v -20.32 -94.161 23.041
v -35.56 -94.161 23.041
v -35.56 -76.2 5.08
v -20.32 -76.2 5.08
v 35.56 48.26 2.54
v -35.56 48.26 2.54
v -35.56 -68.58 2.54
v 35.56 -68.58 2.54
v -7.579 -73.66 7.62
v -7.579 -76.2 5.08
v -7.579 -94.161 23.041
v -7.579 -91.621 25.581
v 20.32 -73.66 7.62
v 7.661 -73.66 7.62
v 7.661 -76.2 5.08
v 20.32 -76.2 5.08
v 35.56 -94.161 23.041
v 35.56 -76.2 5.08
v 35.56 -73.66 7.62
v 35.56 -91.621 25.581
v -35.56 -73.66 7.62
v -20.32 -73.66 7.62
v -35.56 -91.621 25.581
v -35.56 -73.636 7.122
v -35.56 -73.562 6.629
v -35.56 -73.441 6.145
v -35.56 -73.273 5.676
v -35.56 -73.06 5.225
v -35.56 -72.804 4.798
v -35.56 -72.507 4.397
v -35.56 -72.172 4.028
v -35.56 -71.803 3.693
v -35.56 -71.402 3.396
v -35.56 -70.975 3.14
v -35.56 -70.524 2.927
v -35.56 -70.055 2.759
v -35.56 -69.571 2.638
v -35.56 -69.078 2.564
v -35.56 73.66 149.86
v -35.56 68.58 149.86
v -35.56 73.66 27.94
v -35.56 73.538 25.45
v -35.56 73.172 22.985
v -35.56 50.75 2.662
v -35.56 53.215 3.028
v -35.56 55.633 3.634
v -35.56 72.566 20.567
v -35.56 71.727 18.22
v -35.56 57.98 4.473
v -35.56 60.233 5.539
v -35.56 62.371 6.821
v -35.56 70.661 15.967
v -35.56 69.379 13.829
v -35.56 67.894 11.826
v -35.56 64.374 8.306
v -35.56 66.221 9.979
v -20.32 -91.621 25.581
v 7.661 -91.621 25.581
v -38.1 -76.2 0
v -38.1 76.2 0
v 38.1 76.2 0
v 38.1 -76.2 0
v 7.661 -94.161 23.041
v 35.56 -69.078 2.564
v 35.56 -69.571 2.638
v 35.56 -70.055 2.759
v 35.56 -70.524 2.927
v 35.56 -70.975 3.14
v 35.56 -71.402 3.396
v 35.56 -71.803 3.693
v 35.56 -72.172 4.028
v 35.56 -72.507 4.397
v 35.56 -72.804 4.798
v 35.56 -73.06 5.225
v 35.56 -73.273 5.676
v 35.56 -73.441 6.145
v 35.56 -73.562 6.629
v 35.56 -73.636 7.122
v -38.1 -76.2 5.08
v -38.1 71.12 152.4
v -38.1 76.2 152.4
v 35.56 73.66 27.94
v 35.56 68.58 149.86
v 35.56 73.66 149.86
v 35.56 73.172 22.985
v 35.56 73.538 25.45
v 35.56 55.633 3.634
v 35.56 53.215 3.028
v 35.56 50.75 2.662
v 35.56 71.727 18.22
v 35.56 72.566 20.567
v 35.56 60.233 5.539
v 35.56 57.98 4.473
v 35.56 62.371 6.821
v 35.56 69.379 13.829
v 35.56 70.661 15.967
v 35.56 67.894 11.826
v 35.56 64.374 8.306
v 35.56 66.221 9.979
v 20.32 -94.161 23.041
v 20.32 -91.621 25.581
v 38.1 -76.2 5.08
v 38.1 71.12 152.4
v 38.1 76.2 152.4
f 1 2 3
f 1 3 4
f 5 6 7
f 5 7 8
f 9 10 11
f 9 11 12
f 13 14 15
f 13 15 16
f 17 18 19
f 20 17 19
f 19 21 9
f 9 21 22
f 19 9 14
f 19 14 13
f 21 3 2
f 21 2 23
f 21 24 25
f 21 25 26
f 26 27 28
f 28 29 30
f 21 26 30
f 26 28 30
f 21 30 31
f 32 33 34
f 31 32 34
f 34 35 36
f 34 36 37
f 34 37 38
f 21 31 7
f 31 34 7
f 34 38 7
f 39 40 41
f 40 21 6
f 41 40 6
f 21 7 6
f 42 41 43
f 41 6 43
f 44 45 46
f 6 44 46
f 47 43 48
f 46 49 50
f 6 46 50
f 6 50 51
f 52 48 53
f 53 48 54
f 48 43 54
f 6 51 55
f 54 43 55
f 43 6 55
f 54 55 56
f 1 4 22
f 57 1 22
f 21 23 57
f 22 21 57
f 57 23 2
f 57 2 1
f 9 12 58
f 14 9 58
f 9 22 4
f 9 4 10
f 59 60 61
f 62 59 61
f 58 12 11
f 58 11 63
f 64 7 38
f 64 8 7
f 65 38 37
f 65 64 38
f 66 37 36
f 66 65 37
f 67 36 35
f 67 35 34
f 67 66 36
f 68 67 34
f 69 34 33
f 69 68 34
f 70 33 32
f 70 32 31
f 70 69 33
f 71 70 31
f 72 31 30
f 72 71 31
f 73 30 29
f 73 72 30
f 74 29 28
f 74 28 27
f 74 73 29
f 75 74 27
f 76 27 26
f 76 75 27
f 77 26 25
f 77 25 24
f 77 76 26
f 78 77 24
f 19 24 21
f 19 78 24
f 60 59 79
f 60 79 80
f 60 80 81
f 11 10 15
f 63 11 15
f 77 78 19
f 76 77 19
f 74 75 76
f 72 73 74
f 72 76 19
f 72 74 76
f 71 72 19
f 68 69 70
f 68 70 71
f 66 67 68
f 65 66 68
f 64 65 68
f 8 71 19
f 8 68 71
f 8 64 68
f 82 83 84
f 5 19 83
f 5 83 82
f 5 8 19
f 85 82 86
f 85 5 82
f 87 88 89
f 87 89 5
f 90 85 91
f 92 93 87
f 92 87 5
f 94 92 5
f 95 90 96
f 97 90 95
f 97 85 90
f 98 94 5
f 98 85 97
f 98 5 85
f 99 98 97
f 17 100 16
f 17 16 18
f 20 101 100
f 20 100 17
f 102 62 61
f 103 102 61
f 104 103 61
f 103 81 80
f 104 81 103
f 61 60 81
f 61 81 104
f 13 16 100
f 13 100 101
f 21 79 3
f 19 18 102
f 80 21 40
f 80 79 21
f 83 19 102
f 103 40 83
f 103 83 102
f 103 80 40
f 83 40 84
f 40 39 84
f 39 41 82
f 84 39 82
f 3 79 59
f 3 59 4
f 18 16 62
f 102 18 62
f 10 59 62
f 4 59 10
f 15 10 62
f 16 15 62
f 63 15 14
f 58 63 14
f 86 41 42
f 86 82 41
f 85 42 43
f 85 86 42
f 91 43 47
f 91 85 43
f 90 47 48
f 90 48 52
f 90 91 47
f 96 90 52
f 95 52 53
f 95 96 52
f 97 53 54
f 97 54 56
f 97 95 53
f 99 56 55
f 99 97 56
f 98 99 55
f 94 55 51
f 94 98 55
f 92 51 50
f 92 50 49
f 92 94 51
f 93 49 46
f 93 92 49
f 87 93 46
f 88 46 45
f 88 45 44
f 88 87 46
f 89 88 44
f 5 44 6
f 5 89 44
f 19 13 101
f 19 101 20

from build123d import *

# Parameters (mm, degrees)
F0_W     = 76.2
F0_H     = 152.4
F1_DEPTH = 152.4
F2_SIZE  = 147.32
F3_T     = -2.54
F4_R     = 25.4
F5_R     = 5.07999
F6_W     = 15.24
F6_H     = 3.5921024484
F7_DEPTH = 25.4


# Not quite as in the source:
# - a fillet or chamfer is up to 0.001 mm smaller than in the source, because OpenCascade refuses the exact size


with BuildPart() as f1:
    # F0 (on Top) → F1 (new body)
    with BuildSketch(Plane.XY):
        Rectangle(F0_W, F0_H)
    extrude(amount=F1_DEPTH)

    # F2
    f2_edges = [f1.edges().sort_by_distance(p)[0] for p in [
        (0, -76.2, 152.4),
    ]]
    chamfer(f2_edges, length=F2_SIZE)

    # F3
    f3_openings = [f1.faces().sort_by_distance(p)[0] for p in [
        (0, -2.54, 78.74),
    ]]
    offset(amount=F3_T, openings=f3_openings)

    # F4
    f4_edges = [f1.edges().sort_by_distance(p)[0] for p in [
        (0, 73.66, 2.54),
    ]]
    fillet(f4_edges, radius=F4_R)

    # F5 (radius 5.08 in the source; OpenCascade refuses exactly that, so slightly less here)
    f5_edges = [f1.edges().sort_by_distance(p)[0] for p in [
        (0, -73.66, 2.54),
    ]]
    fillet(f5_edges, radius=F5_R)

    # F6 (on face) → F7 (join)
    with BuildSketch(Plane(origin=(0, -40.64, 40.64), x_dir=(1, 0, 0), z_dir=(0, -0.7071067812, 0.7071067812))):
        with Locations((-27.94, -48.4933830538)):
            Rectangle(F6_W, F6_H)
        with Locations((27.94, -48.4933830538)):
            Rectangle(F6_W, F6_H)
        with Locations((0.0408754674, -48.4933830538)):
            Rectangle(F6_W, F6_H)
    extrude(amount=F7_DEPTH)


solid = f1.part
